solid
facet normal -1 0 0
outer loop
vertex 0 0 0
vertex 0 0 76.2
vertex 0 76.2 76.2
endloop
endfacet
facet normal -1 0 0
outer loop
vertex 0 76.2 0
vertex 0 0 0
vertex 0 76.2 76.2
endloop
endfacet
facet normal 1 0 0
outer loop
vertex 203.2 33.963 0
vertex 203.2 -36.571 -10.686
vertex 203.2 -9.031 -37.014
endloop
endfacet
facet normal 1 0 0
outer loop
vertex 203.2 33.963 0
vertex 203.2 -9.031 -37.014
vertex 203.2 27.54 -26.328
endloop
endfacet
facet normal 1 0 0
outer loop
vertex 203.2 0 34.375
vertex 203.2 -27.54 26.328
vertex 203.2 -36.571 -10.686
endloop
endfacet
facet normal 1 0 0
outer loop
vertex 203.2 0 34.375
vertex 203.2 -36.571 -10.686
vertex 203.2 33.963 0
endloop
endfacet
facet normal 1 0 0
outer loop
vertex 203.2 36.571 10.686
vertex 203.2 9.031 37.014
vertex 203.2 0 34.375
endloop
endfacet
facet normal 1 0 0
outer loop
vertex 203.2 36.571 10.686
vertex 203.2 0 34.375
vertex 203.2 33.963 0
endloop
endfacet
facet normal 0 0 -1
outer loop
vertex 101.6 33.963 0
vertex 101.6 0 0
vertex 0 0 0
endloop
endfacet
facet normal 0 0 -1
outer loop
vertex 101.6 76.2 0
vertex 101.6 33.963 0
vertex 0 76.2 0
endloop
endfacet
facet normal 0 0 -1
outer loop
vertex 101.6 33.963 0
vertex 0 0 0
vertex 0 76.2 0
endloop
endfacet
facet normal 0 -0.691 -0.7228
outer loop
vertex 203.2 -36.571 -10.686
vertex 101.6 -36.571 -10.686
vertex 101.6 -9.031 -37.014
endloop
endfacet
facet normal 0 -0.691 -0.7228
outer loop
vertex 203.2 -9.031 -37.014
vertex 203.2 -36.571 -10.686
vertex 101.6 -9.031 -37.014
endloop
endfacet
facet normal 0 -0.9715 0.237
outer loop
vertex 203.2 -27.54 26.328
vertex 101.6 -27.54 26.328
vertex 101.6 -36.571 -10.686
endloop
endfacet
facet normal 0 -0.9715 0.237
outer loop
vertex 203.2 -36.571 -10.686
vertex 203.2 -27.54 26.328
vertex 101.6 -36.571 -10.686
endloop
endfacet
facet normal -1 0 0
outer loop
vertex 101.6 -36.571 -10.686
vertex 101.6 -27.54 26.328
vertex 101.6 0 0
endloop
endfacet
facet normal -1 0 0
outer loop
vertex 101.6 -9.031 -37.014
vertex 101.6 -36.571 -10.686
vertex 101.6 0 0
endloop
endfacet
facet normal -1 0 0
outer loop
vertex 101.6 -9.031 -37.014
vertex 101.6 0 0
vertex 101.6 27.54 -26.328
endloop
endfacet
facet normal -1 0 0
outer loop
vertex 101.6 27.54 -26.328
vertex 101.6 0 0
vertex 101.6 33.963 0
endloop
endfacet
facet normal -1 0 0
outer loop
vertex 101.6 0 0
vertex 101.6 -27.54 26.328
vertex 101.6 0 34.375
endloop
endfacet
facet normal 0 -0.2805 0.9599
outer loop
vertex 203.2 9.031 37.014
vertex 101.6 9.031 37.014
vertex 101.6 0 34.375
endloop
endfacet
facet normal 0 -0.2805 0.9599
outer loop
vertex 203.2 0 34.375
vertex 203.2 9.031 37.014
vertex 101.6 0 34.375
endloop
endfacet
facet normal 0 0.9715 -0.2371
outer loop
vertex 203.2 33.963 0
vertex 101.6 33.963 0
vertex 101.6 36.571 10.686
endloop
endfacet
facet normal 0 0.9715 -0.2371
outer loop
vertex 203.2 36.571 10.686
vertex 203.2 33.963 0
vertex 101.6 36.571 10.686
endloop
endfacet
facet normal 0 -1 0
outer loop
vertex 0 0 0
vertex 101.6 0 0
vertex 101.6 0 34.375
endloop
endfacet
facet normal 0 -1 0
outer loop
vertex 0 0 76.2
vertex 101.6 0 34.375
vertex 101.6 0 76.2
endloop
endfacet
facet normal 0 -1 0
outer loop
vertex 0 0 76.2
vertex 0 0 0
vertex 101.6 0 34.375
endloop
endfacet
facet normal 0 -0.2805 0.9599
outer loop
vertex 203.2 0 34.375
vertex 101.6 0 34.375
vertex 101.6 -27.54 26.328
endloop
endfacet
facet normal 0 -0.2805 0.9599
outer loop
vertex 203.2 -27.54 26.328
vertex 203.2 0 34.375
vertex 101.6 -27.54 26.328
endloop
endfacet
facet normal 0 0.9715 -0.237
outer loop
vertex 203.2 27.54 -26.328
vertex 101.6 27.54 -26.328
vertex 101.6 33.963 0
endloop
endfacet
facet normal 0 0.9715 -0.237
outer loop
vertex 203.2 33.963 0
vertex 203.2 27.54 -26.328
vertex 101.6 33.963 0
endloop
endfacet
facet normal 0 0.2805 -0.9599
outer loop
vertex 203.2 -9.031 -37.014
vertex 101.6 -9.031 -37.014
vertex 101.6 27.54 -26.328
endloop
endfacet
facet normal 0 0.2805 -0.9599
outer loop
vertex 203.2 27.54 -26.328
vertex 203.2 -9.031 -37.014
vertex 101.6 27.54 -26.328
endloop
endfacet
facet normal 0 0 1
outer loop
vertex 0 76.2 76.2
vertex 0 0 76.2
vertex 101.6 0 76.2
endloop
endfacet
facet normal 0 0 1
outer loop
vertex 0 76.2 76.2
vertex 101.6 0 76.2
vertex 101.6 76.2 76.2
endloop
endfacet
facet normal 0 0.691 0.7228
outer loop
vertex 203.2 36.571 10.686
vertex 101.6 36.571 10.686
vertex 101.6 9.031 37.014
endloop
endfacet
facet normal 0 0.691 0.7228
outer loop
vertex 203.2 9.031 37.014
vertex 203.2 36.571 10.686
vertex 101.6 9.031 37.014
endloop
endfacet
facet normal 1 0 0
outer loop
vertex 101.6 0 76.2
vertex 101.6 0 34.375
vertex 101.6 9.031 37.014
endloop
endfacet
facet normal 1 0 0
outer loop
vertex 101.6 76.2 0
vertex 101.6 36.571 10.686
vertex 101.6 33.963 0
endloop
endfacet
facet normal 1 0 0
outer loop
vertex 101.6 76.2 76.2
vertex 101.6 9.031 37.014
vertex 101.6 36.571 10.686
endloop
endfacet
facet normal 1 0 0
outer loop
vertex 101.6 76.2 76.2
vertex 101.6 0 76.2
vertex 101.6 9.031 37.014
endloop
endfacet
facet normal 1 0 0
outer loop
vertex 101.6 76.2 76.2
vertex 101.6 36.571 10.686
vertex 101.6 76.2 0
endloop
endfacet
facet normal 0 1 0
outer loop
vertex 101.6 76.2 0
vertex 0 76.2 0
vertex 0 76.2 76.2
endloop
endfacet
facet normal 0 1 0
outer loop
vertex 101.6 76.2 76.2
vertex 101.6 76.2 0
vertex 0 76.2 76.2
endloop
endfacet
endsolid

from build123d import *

# Parameters (mm, degrees)
F0_W     = 76.2
F0_H     = 76.2
F1_DEPTH = 101.6
F3_DEPTH = 101.6


with BuildPart() as f1:
    # F0 (on Right) → F1 (new body)
    with BuildSketch(Plane.YZ):
        with Locations((38.1, 38.1)):
            Rectangle(F0_W, F0_H)
    extrude(amount=F1_DEPTH)

    # F2 (on face) → F3 (join)
    with BuildSketch(Plane.YZ.offset(101.6)):
        Polygon((-27.540024, 26.327876), (-36.570622, -10.686423), (-9.030597, -37.014299), (27.540024, -26.327876), (33.963392, 0), (0, 0), (0, 34.375438), align=None)
        Polygon((9.030597, 37.014299), (0, 34.375438), (0, 0), (33.963392, 0), (36.570622, 10.686423), align=None)
    extrude(amount=F3_DEPTH)


solid = f1.part
